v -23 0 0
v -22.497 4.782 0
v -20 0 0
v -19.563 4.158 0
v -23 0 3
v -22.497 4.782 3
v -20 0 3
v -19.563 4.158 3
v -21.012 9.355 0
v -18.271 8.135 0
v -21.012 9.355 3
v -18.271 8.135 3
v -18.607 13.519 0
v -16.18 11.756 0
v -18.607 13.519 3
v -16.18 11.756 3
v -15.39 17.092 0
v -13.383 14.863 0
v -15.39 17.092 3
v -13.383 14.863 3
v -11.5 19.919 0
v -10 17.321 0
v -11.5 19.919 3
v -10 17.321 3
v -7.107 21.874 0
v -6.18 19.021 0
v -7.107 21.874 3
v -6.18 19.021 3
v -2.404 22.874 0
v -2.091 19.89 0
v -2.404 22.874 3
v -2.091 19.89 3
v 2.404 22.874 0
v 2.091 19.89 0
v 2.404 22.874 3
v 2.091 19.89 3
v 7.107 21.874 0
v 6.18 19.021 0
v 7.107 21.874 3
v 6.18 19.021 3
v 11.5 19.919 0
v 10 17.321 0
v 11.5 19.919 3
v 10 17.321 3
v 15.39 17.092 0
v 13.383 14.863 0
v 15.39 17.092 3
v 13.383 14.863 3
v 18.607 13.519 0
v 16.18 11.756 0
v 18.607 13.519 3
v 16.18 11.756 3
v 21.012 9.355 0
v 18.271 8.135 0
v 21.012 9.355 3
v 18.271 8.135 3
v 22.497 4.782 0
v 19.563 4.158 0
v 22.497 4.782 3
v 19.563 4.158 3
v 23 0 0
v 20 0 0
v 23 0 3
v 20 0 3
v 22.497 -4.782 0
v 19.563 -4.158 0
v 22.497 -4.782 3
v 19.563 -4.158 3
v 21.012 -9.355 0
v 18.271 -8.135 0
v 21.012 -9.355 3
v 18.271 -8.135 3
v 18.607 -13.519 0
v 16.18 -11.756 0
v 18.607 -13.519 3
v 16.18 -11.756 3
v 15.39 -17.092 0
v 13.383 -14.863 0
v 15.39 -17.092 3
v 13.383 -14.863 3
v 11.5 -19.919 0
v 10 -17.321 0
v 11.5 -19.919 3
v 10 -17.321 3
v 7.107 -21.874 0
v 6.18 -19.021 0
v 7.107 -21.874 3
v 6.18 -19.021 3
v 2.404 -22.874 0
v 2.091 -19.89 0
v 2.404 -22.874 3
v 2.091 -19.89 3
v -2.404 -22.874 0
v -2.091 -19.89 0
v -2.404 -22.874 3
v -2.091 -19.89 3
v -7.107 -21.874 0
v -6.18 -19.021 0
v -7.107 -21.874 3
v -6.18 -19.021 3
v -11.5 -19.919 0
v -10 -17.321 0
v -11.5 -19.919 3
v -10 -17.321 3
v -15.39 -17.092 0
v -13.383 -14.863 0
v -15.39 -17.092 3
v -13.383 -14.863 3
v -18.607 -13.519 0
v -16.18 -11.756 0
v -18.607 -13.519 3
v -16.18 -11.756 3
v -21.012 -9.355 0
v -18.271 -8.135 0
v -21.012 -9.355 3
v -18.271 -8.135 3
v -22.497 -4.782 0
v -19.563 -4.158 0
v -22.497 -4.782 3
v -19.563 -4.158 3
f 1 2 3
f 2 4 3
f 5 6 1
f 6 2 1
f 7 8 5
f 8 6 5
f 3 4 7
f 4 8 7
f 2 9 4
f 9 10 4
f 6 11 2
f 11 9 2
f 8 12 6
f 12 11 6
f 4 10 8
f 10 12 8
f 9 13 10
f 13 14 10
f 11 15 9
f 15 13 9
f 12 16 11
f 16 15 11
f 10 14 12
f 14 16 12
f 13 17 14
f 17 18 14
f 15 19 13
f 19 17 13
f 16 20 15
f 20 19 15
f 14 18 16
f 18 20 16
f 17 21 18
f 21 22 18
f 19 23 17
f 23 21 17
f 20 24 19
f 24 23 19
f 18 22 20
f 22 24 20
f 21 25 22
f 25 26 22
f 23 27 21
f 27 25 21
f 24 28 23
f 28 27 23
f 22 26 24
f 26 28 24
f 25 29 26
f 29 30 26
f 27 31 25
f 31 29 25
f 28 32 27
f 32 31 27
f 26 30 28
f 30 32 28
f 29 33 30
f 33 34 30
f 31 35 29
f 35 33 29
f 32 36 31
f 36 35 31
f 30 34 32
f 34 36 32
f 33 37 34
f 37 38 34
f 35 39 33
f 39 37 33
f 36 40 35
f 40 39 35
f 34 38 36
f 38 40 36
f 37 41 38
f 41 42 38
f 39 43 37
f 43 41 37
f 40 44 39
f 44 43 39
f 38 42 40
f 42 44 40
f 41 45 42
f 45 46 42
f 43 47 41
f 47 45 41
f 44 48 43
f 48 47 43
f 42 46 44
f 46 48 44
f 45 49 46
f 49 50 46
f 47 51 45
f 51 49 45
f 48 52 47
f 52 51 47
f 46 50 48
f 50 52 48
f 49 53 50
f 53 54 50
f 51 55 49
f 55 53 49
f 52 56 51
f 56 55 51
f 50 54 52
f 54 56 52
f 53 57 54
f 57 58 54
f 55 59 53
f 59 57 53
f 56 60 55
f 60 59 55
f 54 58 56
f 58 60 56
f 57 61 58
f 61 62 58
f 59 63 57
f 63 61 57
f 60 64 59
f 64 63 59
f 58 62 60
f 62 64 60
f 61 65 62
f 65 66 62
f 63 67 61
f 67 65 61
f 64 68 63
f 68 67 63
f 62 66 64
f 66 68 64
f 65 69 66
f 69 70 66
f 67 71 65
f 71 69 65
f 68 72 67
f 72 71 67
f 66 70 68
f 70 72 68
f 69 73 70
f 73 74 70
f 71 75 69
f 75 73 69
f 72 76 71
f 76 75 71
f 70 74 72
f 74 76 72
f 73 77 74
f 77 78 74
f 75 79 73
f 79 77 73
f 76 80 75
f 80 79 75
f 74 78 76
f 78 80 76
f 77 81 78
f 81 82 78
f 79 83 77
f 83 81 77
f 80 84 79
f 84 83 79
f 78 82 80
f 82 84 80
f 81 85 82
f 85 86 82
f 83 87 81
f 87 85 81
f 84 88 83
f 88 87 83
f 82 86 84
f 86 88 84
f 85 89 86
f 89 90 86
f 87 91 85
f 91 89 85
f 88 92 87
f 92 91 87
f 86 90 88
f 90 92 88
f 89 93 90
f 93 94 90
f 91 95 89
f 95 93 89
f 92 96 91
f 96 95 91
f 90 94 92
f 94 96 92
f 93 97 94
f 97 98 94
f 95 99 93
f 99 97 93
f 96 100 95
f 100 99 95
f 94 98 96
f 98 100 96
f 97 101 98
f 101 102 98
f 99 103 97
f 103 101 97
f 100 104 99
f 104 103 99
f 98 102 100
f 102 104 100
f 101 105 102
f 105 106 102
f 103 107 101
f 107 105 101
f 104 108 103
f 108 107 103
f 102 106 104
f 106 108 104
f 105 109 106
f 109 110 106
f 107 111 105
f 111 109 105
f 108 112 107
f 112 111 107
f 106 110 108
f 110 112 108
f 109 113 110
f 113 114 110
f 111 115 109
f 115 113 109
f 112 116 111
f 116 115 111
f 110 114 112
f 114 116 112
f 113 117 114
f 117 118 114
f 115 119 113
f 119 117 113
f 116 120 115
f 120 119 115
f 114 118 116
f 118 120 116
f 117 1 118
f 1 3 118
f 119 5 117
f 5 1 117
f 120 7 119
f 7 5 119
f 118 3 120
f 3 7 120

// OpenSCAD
rotate_extrude() {
    translate(v = [20, 0, 0]) square(size = 3);

}
